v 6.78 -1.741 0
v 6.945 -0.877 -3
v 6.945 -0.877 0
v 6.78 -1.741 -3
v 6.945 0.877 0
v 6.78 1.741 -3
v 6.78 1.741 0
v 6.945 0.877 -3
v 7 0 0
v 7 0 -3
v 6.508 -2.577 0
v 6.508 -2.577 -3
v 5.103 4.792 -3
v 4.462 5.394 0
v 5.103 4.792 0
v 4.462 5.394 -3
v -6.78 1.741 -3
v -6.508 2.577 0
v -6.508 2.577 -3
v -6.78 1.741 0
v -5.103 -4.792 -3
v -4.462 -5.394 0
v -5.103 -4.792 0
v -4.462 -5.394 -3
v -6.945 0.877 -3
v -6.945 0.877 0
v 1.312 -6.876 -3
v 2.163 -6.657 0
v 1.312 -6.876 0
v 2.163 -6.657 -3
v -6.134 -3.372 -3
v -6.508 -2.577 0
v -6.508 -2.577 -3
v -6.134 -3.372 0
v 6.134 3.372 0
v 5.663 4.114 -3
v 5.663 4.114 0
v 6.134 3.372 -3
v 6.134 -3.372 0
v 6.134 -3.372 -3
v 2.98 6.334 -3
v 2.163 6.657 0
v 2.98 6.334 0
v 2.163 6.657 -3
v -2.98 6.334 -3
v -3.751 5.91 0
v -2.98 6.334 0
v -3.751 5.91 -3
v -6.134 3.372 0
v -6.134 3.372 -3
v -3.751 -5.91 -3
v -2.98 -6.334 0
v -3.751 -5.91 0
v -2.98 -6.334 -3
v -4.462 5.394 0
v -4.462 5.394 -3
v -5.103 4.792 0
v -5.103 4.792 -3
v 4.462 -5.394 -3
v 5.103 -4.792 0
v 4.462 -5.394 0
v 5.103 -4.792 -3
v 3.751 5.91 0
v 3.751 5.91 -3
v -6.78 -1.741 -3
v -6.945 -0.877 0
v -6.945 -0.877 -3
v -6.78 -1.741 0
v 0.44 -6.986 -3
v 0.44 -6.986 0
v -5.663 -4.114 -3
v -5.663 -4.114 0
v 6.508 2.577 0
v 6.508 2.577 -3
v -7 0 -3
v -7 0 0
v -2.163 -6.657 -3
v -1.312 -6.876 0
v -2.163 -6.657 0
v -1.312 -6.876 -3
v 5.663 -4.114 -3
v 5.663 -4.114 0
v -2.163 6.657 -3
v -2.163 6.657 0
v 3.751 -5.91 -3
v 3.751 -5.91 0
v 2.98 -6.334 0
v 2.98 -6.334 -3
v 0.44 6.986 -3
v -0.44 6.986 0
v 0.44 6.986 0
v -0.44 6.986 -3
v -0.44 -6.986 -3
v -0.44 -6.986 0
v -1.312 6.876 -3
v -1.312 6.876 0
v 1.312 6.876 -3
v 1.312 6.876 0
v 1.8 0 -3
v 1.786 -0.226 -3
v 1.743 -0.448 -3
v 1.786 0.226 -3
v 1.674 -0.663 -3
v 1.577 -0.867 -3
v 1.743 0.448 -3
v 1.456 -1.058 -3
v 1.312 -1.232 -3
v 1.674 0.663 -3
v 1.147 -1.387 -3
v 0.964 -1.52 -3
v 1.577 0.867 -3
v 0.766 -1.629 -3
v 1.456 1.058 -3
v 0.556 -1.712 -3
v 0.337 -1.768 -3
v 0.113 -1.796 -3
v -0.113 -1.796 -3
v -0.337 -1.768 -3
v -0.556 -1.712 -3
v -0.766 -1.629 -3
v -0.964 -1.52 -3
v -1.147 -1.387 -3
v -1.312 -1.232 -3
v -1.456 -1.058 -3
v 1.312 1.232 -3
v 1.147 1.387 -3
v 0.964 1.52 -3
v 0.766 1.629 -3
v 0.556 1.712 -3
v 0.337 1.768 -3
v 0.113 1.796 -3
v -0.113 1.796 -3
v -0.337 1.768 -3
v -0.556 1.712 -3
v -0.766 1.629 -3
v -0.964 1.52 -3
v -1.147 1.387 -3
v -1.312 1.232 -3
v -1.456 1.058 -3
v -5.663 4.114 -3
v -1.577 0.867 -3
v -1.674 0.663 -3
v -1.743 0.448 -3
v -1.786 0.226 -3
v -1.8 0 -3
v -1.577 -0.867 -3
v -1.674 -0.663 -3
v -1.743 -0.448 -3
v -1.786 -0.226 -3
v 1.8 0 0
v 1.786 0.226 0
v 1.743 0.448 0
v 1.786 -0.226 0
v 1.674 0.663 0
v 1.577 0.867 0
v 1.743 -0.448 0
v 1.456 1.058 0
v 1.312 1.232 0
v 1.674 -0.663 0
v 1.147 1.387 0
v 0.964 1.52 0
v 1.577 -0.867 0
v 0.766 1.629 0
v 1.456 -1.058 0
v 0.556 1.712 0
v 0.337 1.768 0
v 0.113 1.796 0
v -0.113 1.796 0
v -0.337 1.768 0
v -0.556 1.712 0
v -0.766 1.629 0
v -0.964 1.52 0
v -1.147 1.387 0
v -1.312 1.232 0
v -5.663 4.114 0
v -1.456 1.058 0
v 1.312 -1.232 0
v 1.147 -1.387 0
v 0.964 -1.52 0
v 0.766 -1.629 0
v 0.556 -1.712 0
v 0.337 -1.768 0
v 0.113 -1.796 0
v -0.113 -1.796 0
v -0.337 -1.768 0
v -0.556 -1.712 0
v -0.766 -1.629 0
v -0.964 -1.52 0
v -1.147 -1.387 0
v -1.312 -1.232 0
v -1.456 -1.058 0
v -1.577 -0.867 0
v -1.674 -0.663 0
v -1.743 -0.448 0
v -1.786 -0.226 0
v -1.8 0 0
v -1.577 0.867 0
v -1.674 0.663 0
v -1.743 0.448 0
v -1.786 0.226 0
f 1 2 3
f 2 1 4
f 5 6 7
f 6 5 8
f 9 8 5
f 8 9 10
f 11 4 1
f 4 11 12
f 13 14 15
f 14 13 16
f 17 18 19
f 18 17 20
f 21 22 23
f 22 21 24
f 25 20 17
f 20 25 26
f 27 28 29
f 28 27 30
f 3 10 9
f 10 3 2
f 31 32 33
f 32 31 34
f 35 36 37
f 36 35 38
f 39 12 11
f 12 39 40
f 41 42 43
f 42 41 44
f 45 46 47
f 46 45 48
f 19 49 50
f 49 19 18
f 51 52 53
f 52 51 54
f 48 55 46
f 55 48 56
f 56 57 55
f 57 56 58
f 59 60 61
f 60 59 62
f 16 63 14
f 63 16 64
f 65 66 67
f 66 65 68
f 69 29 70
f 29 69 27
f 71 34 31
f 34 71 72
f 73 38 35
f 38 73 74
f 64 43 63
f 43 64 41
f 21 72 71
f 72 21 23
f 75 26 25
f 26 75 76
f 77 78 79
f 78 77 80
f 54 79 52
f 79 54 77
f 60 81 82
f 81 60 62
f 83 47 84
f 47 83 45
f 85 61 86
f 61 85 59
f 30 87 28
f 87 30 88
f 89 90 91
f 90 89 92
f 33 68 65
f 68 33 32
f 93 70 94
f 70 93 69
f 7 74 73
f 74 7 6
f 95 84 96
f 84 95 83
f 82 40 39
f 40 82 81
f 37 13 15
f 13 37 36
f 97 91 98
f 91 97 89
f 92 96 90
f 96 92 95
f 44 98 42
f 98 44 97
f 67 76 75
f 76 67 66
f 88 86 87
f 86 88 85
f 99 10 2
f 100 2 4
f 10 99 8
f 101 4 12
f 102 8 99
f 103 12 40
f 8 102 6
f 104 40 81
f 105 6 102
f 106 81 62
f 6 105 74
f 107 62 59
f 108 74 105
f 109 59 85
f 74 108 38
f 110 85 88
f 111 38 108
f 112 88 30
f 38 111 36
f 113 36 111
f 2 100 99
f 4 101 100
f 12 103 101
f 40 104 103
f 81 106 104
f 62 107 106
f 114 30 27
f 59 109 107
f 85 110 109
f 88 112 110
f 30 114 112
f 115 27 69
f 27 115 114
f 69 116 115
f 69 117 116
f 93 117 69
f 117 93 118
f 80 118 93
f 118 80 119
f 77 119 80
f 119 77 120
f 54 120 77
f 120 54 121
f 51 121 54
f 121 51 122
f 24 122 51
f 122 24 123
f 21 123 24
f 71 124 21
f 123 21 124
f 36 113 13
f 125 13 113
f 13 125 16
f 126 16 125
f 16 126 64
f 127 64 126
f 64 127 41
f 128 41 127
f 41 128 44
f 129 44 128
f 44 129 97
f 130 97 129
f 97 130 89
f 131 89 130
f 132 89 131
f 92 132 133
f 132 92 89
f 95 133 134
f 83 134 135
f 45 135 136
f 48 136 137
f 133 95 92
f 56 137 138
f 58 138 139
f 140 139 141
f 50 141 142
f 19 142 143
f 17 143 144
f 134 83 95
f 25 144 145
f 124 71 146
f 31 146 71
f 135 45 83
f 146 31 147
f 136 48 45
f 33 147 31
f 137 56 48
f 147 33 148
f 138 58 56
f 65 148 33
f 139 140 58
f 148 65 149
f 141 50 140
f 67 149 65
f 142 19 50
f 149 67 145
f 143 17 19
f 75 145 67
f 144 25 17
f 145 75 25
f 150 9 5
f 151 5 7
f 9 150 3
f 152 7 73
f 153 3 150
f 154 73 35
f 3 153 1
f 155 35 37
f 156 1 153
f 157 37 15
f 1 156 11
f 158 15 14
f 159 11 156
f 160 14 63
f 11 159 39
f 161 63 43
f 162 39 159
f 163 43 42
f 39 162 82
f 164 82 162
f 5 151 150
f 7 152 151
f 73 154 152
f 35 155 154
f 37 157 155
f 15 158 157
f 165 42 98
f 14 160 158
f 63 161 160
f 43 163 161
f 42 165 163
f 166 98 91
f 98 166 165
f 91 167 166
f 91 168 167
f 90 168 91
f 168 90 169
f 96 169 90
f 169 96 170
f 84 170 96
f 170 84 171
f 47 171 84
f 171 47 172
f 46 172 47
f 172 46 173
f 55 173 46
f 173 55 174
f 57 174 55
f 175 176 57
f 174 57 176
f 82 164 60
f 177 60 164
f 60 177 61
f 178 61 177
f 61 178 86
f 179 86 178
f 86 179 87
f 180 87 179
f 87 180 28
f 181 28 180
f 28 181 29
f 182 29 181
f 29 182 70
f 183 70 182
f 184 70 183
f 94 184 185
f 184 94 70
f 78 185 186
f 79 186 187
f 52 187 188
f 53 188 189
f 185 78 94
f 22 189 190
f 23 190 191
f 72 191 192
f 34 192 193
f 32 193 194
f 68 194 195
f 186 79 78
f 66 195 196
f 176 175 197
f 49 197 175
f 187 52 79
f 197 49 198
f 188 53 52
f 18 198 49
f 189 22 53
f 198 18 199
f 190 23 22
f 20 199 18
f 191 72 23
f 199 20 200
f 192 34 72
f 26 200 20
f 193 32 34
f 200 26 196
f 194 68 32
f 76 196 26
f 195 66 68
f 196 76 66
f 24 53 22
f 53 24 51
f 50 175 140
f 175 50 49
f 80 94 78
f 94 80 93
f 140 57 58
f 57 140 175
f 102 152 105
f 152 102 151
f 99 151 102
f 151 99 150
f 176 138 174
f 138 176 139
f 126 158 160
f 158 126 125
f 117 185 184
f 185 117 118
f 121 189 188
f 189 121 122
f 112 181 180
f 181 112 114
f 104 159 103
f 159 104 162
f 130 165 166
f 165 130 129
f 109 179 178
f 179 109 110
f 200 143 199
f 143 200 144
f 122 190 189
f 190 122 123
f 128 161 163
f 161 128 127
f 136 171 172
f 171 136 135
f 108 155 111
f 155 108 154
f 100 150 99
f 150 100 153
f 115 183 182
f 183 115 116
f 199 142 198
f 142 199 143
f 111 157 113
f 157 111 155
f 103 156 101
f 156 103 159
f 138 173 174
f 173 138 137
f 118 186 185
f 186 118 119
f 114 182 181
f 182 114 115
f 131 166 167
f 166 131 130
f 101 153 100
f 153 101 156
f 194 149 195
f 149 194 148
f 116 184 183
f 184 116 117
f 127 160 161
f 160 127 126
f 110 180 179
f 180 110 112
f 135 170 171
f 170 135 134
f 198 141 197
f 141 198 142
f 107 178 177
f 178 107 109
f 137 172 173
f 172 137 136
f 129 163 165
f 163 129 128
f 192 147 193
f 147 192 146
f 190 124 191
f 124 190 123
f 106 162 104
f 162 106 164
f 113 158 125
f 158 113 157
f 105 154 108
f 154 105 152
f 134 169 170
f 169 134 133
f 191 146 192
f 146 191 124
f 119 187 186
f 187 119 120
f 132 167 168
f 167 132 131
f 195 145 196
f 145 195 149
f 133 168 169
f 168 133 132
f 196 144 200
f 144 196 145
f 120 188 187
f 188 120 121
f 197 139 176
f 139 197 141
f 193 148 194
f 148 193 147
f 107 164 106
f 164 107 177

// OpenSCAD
$fn = 50;


difference() {
	union() {
		translate(v = [0, 0, -3.0000000000]) {
			cylinder(h = 3, r = 7.0000000000);
		}
		cylinder(h = 0, r = 17.0000000000);
	}
	union() {
		#translate(v = [0, 0, -3]) {
			cylinder(h = 3, r = 1.8000000000);
		}
	}
}
